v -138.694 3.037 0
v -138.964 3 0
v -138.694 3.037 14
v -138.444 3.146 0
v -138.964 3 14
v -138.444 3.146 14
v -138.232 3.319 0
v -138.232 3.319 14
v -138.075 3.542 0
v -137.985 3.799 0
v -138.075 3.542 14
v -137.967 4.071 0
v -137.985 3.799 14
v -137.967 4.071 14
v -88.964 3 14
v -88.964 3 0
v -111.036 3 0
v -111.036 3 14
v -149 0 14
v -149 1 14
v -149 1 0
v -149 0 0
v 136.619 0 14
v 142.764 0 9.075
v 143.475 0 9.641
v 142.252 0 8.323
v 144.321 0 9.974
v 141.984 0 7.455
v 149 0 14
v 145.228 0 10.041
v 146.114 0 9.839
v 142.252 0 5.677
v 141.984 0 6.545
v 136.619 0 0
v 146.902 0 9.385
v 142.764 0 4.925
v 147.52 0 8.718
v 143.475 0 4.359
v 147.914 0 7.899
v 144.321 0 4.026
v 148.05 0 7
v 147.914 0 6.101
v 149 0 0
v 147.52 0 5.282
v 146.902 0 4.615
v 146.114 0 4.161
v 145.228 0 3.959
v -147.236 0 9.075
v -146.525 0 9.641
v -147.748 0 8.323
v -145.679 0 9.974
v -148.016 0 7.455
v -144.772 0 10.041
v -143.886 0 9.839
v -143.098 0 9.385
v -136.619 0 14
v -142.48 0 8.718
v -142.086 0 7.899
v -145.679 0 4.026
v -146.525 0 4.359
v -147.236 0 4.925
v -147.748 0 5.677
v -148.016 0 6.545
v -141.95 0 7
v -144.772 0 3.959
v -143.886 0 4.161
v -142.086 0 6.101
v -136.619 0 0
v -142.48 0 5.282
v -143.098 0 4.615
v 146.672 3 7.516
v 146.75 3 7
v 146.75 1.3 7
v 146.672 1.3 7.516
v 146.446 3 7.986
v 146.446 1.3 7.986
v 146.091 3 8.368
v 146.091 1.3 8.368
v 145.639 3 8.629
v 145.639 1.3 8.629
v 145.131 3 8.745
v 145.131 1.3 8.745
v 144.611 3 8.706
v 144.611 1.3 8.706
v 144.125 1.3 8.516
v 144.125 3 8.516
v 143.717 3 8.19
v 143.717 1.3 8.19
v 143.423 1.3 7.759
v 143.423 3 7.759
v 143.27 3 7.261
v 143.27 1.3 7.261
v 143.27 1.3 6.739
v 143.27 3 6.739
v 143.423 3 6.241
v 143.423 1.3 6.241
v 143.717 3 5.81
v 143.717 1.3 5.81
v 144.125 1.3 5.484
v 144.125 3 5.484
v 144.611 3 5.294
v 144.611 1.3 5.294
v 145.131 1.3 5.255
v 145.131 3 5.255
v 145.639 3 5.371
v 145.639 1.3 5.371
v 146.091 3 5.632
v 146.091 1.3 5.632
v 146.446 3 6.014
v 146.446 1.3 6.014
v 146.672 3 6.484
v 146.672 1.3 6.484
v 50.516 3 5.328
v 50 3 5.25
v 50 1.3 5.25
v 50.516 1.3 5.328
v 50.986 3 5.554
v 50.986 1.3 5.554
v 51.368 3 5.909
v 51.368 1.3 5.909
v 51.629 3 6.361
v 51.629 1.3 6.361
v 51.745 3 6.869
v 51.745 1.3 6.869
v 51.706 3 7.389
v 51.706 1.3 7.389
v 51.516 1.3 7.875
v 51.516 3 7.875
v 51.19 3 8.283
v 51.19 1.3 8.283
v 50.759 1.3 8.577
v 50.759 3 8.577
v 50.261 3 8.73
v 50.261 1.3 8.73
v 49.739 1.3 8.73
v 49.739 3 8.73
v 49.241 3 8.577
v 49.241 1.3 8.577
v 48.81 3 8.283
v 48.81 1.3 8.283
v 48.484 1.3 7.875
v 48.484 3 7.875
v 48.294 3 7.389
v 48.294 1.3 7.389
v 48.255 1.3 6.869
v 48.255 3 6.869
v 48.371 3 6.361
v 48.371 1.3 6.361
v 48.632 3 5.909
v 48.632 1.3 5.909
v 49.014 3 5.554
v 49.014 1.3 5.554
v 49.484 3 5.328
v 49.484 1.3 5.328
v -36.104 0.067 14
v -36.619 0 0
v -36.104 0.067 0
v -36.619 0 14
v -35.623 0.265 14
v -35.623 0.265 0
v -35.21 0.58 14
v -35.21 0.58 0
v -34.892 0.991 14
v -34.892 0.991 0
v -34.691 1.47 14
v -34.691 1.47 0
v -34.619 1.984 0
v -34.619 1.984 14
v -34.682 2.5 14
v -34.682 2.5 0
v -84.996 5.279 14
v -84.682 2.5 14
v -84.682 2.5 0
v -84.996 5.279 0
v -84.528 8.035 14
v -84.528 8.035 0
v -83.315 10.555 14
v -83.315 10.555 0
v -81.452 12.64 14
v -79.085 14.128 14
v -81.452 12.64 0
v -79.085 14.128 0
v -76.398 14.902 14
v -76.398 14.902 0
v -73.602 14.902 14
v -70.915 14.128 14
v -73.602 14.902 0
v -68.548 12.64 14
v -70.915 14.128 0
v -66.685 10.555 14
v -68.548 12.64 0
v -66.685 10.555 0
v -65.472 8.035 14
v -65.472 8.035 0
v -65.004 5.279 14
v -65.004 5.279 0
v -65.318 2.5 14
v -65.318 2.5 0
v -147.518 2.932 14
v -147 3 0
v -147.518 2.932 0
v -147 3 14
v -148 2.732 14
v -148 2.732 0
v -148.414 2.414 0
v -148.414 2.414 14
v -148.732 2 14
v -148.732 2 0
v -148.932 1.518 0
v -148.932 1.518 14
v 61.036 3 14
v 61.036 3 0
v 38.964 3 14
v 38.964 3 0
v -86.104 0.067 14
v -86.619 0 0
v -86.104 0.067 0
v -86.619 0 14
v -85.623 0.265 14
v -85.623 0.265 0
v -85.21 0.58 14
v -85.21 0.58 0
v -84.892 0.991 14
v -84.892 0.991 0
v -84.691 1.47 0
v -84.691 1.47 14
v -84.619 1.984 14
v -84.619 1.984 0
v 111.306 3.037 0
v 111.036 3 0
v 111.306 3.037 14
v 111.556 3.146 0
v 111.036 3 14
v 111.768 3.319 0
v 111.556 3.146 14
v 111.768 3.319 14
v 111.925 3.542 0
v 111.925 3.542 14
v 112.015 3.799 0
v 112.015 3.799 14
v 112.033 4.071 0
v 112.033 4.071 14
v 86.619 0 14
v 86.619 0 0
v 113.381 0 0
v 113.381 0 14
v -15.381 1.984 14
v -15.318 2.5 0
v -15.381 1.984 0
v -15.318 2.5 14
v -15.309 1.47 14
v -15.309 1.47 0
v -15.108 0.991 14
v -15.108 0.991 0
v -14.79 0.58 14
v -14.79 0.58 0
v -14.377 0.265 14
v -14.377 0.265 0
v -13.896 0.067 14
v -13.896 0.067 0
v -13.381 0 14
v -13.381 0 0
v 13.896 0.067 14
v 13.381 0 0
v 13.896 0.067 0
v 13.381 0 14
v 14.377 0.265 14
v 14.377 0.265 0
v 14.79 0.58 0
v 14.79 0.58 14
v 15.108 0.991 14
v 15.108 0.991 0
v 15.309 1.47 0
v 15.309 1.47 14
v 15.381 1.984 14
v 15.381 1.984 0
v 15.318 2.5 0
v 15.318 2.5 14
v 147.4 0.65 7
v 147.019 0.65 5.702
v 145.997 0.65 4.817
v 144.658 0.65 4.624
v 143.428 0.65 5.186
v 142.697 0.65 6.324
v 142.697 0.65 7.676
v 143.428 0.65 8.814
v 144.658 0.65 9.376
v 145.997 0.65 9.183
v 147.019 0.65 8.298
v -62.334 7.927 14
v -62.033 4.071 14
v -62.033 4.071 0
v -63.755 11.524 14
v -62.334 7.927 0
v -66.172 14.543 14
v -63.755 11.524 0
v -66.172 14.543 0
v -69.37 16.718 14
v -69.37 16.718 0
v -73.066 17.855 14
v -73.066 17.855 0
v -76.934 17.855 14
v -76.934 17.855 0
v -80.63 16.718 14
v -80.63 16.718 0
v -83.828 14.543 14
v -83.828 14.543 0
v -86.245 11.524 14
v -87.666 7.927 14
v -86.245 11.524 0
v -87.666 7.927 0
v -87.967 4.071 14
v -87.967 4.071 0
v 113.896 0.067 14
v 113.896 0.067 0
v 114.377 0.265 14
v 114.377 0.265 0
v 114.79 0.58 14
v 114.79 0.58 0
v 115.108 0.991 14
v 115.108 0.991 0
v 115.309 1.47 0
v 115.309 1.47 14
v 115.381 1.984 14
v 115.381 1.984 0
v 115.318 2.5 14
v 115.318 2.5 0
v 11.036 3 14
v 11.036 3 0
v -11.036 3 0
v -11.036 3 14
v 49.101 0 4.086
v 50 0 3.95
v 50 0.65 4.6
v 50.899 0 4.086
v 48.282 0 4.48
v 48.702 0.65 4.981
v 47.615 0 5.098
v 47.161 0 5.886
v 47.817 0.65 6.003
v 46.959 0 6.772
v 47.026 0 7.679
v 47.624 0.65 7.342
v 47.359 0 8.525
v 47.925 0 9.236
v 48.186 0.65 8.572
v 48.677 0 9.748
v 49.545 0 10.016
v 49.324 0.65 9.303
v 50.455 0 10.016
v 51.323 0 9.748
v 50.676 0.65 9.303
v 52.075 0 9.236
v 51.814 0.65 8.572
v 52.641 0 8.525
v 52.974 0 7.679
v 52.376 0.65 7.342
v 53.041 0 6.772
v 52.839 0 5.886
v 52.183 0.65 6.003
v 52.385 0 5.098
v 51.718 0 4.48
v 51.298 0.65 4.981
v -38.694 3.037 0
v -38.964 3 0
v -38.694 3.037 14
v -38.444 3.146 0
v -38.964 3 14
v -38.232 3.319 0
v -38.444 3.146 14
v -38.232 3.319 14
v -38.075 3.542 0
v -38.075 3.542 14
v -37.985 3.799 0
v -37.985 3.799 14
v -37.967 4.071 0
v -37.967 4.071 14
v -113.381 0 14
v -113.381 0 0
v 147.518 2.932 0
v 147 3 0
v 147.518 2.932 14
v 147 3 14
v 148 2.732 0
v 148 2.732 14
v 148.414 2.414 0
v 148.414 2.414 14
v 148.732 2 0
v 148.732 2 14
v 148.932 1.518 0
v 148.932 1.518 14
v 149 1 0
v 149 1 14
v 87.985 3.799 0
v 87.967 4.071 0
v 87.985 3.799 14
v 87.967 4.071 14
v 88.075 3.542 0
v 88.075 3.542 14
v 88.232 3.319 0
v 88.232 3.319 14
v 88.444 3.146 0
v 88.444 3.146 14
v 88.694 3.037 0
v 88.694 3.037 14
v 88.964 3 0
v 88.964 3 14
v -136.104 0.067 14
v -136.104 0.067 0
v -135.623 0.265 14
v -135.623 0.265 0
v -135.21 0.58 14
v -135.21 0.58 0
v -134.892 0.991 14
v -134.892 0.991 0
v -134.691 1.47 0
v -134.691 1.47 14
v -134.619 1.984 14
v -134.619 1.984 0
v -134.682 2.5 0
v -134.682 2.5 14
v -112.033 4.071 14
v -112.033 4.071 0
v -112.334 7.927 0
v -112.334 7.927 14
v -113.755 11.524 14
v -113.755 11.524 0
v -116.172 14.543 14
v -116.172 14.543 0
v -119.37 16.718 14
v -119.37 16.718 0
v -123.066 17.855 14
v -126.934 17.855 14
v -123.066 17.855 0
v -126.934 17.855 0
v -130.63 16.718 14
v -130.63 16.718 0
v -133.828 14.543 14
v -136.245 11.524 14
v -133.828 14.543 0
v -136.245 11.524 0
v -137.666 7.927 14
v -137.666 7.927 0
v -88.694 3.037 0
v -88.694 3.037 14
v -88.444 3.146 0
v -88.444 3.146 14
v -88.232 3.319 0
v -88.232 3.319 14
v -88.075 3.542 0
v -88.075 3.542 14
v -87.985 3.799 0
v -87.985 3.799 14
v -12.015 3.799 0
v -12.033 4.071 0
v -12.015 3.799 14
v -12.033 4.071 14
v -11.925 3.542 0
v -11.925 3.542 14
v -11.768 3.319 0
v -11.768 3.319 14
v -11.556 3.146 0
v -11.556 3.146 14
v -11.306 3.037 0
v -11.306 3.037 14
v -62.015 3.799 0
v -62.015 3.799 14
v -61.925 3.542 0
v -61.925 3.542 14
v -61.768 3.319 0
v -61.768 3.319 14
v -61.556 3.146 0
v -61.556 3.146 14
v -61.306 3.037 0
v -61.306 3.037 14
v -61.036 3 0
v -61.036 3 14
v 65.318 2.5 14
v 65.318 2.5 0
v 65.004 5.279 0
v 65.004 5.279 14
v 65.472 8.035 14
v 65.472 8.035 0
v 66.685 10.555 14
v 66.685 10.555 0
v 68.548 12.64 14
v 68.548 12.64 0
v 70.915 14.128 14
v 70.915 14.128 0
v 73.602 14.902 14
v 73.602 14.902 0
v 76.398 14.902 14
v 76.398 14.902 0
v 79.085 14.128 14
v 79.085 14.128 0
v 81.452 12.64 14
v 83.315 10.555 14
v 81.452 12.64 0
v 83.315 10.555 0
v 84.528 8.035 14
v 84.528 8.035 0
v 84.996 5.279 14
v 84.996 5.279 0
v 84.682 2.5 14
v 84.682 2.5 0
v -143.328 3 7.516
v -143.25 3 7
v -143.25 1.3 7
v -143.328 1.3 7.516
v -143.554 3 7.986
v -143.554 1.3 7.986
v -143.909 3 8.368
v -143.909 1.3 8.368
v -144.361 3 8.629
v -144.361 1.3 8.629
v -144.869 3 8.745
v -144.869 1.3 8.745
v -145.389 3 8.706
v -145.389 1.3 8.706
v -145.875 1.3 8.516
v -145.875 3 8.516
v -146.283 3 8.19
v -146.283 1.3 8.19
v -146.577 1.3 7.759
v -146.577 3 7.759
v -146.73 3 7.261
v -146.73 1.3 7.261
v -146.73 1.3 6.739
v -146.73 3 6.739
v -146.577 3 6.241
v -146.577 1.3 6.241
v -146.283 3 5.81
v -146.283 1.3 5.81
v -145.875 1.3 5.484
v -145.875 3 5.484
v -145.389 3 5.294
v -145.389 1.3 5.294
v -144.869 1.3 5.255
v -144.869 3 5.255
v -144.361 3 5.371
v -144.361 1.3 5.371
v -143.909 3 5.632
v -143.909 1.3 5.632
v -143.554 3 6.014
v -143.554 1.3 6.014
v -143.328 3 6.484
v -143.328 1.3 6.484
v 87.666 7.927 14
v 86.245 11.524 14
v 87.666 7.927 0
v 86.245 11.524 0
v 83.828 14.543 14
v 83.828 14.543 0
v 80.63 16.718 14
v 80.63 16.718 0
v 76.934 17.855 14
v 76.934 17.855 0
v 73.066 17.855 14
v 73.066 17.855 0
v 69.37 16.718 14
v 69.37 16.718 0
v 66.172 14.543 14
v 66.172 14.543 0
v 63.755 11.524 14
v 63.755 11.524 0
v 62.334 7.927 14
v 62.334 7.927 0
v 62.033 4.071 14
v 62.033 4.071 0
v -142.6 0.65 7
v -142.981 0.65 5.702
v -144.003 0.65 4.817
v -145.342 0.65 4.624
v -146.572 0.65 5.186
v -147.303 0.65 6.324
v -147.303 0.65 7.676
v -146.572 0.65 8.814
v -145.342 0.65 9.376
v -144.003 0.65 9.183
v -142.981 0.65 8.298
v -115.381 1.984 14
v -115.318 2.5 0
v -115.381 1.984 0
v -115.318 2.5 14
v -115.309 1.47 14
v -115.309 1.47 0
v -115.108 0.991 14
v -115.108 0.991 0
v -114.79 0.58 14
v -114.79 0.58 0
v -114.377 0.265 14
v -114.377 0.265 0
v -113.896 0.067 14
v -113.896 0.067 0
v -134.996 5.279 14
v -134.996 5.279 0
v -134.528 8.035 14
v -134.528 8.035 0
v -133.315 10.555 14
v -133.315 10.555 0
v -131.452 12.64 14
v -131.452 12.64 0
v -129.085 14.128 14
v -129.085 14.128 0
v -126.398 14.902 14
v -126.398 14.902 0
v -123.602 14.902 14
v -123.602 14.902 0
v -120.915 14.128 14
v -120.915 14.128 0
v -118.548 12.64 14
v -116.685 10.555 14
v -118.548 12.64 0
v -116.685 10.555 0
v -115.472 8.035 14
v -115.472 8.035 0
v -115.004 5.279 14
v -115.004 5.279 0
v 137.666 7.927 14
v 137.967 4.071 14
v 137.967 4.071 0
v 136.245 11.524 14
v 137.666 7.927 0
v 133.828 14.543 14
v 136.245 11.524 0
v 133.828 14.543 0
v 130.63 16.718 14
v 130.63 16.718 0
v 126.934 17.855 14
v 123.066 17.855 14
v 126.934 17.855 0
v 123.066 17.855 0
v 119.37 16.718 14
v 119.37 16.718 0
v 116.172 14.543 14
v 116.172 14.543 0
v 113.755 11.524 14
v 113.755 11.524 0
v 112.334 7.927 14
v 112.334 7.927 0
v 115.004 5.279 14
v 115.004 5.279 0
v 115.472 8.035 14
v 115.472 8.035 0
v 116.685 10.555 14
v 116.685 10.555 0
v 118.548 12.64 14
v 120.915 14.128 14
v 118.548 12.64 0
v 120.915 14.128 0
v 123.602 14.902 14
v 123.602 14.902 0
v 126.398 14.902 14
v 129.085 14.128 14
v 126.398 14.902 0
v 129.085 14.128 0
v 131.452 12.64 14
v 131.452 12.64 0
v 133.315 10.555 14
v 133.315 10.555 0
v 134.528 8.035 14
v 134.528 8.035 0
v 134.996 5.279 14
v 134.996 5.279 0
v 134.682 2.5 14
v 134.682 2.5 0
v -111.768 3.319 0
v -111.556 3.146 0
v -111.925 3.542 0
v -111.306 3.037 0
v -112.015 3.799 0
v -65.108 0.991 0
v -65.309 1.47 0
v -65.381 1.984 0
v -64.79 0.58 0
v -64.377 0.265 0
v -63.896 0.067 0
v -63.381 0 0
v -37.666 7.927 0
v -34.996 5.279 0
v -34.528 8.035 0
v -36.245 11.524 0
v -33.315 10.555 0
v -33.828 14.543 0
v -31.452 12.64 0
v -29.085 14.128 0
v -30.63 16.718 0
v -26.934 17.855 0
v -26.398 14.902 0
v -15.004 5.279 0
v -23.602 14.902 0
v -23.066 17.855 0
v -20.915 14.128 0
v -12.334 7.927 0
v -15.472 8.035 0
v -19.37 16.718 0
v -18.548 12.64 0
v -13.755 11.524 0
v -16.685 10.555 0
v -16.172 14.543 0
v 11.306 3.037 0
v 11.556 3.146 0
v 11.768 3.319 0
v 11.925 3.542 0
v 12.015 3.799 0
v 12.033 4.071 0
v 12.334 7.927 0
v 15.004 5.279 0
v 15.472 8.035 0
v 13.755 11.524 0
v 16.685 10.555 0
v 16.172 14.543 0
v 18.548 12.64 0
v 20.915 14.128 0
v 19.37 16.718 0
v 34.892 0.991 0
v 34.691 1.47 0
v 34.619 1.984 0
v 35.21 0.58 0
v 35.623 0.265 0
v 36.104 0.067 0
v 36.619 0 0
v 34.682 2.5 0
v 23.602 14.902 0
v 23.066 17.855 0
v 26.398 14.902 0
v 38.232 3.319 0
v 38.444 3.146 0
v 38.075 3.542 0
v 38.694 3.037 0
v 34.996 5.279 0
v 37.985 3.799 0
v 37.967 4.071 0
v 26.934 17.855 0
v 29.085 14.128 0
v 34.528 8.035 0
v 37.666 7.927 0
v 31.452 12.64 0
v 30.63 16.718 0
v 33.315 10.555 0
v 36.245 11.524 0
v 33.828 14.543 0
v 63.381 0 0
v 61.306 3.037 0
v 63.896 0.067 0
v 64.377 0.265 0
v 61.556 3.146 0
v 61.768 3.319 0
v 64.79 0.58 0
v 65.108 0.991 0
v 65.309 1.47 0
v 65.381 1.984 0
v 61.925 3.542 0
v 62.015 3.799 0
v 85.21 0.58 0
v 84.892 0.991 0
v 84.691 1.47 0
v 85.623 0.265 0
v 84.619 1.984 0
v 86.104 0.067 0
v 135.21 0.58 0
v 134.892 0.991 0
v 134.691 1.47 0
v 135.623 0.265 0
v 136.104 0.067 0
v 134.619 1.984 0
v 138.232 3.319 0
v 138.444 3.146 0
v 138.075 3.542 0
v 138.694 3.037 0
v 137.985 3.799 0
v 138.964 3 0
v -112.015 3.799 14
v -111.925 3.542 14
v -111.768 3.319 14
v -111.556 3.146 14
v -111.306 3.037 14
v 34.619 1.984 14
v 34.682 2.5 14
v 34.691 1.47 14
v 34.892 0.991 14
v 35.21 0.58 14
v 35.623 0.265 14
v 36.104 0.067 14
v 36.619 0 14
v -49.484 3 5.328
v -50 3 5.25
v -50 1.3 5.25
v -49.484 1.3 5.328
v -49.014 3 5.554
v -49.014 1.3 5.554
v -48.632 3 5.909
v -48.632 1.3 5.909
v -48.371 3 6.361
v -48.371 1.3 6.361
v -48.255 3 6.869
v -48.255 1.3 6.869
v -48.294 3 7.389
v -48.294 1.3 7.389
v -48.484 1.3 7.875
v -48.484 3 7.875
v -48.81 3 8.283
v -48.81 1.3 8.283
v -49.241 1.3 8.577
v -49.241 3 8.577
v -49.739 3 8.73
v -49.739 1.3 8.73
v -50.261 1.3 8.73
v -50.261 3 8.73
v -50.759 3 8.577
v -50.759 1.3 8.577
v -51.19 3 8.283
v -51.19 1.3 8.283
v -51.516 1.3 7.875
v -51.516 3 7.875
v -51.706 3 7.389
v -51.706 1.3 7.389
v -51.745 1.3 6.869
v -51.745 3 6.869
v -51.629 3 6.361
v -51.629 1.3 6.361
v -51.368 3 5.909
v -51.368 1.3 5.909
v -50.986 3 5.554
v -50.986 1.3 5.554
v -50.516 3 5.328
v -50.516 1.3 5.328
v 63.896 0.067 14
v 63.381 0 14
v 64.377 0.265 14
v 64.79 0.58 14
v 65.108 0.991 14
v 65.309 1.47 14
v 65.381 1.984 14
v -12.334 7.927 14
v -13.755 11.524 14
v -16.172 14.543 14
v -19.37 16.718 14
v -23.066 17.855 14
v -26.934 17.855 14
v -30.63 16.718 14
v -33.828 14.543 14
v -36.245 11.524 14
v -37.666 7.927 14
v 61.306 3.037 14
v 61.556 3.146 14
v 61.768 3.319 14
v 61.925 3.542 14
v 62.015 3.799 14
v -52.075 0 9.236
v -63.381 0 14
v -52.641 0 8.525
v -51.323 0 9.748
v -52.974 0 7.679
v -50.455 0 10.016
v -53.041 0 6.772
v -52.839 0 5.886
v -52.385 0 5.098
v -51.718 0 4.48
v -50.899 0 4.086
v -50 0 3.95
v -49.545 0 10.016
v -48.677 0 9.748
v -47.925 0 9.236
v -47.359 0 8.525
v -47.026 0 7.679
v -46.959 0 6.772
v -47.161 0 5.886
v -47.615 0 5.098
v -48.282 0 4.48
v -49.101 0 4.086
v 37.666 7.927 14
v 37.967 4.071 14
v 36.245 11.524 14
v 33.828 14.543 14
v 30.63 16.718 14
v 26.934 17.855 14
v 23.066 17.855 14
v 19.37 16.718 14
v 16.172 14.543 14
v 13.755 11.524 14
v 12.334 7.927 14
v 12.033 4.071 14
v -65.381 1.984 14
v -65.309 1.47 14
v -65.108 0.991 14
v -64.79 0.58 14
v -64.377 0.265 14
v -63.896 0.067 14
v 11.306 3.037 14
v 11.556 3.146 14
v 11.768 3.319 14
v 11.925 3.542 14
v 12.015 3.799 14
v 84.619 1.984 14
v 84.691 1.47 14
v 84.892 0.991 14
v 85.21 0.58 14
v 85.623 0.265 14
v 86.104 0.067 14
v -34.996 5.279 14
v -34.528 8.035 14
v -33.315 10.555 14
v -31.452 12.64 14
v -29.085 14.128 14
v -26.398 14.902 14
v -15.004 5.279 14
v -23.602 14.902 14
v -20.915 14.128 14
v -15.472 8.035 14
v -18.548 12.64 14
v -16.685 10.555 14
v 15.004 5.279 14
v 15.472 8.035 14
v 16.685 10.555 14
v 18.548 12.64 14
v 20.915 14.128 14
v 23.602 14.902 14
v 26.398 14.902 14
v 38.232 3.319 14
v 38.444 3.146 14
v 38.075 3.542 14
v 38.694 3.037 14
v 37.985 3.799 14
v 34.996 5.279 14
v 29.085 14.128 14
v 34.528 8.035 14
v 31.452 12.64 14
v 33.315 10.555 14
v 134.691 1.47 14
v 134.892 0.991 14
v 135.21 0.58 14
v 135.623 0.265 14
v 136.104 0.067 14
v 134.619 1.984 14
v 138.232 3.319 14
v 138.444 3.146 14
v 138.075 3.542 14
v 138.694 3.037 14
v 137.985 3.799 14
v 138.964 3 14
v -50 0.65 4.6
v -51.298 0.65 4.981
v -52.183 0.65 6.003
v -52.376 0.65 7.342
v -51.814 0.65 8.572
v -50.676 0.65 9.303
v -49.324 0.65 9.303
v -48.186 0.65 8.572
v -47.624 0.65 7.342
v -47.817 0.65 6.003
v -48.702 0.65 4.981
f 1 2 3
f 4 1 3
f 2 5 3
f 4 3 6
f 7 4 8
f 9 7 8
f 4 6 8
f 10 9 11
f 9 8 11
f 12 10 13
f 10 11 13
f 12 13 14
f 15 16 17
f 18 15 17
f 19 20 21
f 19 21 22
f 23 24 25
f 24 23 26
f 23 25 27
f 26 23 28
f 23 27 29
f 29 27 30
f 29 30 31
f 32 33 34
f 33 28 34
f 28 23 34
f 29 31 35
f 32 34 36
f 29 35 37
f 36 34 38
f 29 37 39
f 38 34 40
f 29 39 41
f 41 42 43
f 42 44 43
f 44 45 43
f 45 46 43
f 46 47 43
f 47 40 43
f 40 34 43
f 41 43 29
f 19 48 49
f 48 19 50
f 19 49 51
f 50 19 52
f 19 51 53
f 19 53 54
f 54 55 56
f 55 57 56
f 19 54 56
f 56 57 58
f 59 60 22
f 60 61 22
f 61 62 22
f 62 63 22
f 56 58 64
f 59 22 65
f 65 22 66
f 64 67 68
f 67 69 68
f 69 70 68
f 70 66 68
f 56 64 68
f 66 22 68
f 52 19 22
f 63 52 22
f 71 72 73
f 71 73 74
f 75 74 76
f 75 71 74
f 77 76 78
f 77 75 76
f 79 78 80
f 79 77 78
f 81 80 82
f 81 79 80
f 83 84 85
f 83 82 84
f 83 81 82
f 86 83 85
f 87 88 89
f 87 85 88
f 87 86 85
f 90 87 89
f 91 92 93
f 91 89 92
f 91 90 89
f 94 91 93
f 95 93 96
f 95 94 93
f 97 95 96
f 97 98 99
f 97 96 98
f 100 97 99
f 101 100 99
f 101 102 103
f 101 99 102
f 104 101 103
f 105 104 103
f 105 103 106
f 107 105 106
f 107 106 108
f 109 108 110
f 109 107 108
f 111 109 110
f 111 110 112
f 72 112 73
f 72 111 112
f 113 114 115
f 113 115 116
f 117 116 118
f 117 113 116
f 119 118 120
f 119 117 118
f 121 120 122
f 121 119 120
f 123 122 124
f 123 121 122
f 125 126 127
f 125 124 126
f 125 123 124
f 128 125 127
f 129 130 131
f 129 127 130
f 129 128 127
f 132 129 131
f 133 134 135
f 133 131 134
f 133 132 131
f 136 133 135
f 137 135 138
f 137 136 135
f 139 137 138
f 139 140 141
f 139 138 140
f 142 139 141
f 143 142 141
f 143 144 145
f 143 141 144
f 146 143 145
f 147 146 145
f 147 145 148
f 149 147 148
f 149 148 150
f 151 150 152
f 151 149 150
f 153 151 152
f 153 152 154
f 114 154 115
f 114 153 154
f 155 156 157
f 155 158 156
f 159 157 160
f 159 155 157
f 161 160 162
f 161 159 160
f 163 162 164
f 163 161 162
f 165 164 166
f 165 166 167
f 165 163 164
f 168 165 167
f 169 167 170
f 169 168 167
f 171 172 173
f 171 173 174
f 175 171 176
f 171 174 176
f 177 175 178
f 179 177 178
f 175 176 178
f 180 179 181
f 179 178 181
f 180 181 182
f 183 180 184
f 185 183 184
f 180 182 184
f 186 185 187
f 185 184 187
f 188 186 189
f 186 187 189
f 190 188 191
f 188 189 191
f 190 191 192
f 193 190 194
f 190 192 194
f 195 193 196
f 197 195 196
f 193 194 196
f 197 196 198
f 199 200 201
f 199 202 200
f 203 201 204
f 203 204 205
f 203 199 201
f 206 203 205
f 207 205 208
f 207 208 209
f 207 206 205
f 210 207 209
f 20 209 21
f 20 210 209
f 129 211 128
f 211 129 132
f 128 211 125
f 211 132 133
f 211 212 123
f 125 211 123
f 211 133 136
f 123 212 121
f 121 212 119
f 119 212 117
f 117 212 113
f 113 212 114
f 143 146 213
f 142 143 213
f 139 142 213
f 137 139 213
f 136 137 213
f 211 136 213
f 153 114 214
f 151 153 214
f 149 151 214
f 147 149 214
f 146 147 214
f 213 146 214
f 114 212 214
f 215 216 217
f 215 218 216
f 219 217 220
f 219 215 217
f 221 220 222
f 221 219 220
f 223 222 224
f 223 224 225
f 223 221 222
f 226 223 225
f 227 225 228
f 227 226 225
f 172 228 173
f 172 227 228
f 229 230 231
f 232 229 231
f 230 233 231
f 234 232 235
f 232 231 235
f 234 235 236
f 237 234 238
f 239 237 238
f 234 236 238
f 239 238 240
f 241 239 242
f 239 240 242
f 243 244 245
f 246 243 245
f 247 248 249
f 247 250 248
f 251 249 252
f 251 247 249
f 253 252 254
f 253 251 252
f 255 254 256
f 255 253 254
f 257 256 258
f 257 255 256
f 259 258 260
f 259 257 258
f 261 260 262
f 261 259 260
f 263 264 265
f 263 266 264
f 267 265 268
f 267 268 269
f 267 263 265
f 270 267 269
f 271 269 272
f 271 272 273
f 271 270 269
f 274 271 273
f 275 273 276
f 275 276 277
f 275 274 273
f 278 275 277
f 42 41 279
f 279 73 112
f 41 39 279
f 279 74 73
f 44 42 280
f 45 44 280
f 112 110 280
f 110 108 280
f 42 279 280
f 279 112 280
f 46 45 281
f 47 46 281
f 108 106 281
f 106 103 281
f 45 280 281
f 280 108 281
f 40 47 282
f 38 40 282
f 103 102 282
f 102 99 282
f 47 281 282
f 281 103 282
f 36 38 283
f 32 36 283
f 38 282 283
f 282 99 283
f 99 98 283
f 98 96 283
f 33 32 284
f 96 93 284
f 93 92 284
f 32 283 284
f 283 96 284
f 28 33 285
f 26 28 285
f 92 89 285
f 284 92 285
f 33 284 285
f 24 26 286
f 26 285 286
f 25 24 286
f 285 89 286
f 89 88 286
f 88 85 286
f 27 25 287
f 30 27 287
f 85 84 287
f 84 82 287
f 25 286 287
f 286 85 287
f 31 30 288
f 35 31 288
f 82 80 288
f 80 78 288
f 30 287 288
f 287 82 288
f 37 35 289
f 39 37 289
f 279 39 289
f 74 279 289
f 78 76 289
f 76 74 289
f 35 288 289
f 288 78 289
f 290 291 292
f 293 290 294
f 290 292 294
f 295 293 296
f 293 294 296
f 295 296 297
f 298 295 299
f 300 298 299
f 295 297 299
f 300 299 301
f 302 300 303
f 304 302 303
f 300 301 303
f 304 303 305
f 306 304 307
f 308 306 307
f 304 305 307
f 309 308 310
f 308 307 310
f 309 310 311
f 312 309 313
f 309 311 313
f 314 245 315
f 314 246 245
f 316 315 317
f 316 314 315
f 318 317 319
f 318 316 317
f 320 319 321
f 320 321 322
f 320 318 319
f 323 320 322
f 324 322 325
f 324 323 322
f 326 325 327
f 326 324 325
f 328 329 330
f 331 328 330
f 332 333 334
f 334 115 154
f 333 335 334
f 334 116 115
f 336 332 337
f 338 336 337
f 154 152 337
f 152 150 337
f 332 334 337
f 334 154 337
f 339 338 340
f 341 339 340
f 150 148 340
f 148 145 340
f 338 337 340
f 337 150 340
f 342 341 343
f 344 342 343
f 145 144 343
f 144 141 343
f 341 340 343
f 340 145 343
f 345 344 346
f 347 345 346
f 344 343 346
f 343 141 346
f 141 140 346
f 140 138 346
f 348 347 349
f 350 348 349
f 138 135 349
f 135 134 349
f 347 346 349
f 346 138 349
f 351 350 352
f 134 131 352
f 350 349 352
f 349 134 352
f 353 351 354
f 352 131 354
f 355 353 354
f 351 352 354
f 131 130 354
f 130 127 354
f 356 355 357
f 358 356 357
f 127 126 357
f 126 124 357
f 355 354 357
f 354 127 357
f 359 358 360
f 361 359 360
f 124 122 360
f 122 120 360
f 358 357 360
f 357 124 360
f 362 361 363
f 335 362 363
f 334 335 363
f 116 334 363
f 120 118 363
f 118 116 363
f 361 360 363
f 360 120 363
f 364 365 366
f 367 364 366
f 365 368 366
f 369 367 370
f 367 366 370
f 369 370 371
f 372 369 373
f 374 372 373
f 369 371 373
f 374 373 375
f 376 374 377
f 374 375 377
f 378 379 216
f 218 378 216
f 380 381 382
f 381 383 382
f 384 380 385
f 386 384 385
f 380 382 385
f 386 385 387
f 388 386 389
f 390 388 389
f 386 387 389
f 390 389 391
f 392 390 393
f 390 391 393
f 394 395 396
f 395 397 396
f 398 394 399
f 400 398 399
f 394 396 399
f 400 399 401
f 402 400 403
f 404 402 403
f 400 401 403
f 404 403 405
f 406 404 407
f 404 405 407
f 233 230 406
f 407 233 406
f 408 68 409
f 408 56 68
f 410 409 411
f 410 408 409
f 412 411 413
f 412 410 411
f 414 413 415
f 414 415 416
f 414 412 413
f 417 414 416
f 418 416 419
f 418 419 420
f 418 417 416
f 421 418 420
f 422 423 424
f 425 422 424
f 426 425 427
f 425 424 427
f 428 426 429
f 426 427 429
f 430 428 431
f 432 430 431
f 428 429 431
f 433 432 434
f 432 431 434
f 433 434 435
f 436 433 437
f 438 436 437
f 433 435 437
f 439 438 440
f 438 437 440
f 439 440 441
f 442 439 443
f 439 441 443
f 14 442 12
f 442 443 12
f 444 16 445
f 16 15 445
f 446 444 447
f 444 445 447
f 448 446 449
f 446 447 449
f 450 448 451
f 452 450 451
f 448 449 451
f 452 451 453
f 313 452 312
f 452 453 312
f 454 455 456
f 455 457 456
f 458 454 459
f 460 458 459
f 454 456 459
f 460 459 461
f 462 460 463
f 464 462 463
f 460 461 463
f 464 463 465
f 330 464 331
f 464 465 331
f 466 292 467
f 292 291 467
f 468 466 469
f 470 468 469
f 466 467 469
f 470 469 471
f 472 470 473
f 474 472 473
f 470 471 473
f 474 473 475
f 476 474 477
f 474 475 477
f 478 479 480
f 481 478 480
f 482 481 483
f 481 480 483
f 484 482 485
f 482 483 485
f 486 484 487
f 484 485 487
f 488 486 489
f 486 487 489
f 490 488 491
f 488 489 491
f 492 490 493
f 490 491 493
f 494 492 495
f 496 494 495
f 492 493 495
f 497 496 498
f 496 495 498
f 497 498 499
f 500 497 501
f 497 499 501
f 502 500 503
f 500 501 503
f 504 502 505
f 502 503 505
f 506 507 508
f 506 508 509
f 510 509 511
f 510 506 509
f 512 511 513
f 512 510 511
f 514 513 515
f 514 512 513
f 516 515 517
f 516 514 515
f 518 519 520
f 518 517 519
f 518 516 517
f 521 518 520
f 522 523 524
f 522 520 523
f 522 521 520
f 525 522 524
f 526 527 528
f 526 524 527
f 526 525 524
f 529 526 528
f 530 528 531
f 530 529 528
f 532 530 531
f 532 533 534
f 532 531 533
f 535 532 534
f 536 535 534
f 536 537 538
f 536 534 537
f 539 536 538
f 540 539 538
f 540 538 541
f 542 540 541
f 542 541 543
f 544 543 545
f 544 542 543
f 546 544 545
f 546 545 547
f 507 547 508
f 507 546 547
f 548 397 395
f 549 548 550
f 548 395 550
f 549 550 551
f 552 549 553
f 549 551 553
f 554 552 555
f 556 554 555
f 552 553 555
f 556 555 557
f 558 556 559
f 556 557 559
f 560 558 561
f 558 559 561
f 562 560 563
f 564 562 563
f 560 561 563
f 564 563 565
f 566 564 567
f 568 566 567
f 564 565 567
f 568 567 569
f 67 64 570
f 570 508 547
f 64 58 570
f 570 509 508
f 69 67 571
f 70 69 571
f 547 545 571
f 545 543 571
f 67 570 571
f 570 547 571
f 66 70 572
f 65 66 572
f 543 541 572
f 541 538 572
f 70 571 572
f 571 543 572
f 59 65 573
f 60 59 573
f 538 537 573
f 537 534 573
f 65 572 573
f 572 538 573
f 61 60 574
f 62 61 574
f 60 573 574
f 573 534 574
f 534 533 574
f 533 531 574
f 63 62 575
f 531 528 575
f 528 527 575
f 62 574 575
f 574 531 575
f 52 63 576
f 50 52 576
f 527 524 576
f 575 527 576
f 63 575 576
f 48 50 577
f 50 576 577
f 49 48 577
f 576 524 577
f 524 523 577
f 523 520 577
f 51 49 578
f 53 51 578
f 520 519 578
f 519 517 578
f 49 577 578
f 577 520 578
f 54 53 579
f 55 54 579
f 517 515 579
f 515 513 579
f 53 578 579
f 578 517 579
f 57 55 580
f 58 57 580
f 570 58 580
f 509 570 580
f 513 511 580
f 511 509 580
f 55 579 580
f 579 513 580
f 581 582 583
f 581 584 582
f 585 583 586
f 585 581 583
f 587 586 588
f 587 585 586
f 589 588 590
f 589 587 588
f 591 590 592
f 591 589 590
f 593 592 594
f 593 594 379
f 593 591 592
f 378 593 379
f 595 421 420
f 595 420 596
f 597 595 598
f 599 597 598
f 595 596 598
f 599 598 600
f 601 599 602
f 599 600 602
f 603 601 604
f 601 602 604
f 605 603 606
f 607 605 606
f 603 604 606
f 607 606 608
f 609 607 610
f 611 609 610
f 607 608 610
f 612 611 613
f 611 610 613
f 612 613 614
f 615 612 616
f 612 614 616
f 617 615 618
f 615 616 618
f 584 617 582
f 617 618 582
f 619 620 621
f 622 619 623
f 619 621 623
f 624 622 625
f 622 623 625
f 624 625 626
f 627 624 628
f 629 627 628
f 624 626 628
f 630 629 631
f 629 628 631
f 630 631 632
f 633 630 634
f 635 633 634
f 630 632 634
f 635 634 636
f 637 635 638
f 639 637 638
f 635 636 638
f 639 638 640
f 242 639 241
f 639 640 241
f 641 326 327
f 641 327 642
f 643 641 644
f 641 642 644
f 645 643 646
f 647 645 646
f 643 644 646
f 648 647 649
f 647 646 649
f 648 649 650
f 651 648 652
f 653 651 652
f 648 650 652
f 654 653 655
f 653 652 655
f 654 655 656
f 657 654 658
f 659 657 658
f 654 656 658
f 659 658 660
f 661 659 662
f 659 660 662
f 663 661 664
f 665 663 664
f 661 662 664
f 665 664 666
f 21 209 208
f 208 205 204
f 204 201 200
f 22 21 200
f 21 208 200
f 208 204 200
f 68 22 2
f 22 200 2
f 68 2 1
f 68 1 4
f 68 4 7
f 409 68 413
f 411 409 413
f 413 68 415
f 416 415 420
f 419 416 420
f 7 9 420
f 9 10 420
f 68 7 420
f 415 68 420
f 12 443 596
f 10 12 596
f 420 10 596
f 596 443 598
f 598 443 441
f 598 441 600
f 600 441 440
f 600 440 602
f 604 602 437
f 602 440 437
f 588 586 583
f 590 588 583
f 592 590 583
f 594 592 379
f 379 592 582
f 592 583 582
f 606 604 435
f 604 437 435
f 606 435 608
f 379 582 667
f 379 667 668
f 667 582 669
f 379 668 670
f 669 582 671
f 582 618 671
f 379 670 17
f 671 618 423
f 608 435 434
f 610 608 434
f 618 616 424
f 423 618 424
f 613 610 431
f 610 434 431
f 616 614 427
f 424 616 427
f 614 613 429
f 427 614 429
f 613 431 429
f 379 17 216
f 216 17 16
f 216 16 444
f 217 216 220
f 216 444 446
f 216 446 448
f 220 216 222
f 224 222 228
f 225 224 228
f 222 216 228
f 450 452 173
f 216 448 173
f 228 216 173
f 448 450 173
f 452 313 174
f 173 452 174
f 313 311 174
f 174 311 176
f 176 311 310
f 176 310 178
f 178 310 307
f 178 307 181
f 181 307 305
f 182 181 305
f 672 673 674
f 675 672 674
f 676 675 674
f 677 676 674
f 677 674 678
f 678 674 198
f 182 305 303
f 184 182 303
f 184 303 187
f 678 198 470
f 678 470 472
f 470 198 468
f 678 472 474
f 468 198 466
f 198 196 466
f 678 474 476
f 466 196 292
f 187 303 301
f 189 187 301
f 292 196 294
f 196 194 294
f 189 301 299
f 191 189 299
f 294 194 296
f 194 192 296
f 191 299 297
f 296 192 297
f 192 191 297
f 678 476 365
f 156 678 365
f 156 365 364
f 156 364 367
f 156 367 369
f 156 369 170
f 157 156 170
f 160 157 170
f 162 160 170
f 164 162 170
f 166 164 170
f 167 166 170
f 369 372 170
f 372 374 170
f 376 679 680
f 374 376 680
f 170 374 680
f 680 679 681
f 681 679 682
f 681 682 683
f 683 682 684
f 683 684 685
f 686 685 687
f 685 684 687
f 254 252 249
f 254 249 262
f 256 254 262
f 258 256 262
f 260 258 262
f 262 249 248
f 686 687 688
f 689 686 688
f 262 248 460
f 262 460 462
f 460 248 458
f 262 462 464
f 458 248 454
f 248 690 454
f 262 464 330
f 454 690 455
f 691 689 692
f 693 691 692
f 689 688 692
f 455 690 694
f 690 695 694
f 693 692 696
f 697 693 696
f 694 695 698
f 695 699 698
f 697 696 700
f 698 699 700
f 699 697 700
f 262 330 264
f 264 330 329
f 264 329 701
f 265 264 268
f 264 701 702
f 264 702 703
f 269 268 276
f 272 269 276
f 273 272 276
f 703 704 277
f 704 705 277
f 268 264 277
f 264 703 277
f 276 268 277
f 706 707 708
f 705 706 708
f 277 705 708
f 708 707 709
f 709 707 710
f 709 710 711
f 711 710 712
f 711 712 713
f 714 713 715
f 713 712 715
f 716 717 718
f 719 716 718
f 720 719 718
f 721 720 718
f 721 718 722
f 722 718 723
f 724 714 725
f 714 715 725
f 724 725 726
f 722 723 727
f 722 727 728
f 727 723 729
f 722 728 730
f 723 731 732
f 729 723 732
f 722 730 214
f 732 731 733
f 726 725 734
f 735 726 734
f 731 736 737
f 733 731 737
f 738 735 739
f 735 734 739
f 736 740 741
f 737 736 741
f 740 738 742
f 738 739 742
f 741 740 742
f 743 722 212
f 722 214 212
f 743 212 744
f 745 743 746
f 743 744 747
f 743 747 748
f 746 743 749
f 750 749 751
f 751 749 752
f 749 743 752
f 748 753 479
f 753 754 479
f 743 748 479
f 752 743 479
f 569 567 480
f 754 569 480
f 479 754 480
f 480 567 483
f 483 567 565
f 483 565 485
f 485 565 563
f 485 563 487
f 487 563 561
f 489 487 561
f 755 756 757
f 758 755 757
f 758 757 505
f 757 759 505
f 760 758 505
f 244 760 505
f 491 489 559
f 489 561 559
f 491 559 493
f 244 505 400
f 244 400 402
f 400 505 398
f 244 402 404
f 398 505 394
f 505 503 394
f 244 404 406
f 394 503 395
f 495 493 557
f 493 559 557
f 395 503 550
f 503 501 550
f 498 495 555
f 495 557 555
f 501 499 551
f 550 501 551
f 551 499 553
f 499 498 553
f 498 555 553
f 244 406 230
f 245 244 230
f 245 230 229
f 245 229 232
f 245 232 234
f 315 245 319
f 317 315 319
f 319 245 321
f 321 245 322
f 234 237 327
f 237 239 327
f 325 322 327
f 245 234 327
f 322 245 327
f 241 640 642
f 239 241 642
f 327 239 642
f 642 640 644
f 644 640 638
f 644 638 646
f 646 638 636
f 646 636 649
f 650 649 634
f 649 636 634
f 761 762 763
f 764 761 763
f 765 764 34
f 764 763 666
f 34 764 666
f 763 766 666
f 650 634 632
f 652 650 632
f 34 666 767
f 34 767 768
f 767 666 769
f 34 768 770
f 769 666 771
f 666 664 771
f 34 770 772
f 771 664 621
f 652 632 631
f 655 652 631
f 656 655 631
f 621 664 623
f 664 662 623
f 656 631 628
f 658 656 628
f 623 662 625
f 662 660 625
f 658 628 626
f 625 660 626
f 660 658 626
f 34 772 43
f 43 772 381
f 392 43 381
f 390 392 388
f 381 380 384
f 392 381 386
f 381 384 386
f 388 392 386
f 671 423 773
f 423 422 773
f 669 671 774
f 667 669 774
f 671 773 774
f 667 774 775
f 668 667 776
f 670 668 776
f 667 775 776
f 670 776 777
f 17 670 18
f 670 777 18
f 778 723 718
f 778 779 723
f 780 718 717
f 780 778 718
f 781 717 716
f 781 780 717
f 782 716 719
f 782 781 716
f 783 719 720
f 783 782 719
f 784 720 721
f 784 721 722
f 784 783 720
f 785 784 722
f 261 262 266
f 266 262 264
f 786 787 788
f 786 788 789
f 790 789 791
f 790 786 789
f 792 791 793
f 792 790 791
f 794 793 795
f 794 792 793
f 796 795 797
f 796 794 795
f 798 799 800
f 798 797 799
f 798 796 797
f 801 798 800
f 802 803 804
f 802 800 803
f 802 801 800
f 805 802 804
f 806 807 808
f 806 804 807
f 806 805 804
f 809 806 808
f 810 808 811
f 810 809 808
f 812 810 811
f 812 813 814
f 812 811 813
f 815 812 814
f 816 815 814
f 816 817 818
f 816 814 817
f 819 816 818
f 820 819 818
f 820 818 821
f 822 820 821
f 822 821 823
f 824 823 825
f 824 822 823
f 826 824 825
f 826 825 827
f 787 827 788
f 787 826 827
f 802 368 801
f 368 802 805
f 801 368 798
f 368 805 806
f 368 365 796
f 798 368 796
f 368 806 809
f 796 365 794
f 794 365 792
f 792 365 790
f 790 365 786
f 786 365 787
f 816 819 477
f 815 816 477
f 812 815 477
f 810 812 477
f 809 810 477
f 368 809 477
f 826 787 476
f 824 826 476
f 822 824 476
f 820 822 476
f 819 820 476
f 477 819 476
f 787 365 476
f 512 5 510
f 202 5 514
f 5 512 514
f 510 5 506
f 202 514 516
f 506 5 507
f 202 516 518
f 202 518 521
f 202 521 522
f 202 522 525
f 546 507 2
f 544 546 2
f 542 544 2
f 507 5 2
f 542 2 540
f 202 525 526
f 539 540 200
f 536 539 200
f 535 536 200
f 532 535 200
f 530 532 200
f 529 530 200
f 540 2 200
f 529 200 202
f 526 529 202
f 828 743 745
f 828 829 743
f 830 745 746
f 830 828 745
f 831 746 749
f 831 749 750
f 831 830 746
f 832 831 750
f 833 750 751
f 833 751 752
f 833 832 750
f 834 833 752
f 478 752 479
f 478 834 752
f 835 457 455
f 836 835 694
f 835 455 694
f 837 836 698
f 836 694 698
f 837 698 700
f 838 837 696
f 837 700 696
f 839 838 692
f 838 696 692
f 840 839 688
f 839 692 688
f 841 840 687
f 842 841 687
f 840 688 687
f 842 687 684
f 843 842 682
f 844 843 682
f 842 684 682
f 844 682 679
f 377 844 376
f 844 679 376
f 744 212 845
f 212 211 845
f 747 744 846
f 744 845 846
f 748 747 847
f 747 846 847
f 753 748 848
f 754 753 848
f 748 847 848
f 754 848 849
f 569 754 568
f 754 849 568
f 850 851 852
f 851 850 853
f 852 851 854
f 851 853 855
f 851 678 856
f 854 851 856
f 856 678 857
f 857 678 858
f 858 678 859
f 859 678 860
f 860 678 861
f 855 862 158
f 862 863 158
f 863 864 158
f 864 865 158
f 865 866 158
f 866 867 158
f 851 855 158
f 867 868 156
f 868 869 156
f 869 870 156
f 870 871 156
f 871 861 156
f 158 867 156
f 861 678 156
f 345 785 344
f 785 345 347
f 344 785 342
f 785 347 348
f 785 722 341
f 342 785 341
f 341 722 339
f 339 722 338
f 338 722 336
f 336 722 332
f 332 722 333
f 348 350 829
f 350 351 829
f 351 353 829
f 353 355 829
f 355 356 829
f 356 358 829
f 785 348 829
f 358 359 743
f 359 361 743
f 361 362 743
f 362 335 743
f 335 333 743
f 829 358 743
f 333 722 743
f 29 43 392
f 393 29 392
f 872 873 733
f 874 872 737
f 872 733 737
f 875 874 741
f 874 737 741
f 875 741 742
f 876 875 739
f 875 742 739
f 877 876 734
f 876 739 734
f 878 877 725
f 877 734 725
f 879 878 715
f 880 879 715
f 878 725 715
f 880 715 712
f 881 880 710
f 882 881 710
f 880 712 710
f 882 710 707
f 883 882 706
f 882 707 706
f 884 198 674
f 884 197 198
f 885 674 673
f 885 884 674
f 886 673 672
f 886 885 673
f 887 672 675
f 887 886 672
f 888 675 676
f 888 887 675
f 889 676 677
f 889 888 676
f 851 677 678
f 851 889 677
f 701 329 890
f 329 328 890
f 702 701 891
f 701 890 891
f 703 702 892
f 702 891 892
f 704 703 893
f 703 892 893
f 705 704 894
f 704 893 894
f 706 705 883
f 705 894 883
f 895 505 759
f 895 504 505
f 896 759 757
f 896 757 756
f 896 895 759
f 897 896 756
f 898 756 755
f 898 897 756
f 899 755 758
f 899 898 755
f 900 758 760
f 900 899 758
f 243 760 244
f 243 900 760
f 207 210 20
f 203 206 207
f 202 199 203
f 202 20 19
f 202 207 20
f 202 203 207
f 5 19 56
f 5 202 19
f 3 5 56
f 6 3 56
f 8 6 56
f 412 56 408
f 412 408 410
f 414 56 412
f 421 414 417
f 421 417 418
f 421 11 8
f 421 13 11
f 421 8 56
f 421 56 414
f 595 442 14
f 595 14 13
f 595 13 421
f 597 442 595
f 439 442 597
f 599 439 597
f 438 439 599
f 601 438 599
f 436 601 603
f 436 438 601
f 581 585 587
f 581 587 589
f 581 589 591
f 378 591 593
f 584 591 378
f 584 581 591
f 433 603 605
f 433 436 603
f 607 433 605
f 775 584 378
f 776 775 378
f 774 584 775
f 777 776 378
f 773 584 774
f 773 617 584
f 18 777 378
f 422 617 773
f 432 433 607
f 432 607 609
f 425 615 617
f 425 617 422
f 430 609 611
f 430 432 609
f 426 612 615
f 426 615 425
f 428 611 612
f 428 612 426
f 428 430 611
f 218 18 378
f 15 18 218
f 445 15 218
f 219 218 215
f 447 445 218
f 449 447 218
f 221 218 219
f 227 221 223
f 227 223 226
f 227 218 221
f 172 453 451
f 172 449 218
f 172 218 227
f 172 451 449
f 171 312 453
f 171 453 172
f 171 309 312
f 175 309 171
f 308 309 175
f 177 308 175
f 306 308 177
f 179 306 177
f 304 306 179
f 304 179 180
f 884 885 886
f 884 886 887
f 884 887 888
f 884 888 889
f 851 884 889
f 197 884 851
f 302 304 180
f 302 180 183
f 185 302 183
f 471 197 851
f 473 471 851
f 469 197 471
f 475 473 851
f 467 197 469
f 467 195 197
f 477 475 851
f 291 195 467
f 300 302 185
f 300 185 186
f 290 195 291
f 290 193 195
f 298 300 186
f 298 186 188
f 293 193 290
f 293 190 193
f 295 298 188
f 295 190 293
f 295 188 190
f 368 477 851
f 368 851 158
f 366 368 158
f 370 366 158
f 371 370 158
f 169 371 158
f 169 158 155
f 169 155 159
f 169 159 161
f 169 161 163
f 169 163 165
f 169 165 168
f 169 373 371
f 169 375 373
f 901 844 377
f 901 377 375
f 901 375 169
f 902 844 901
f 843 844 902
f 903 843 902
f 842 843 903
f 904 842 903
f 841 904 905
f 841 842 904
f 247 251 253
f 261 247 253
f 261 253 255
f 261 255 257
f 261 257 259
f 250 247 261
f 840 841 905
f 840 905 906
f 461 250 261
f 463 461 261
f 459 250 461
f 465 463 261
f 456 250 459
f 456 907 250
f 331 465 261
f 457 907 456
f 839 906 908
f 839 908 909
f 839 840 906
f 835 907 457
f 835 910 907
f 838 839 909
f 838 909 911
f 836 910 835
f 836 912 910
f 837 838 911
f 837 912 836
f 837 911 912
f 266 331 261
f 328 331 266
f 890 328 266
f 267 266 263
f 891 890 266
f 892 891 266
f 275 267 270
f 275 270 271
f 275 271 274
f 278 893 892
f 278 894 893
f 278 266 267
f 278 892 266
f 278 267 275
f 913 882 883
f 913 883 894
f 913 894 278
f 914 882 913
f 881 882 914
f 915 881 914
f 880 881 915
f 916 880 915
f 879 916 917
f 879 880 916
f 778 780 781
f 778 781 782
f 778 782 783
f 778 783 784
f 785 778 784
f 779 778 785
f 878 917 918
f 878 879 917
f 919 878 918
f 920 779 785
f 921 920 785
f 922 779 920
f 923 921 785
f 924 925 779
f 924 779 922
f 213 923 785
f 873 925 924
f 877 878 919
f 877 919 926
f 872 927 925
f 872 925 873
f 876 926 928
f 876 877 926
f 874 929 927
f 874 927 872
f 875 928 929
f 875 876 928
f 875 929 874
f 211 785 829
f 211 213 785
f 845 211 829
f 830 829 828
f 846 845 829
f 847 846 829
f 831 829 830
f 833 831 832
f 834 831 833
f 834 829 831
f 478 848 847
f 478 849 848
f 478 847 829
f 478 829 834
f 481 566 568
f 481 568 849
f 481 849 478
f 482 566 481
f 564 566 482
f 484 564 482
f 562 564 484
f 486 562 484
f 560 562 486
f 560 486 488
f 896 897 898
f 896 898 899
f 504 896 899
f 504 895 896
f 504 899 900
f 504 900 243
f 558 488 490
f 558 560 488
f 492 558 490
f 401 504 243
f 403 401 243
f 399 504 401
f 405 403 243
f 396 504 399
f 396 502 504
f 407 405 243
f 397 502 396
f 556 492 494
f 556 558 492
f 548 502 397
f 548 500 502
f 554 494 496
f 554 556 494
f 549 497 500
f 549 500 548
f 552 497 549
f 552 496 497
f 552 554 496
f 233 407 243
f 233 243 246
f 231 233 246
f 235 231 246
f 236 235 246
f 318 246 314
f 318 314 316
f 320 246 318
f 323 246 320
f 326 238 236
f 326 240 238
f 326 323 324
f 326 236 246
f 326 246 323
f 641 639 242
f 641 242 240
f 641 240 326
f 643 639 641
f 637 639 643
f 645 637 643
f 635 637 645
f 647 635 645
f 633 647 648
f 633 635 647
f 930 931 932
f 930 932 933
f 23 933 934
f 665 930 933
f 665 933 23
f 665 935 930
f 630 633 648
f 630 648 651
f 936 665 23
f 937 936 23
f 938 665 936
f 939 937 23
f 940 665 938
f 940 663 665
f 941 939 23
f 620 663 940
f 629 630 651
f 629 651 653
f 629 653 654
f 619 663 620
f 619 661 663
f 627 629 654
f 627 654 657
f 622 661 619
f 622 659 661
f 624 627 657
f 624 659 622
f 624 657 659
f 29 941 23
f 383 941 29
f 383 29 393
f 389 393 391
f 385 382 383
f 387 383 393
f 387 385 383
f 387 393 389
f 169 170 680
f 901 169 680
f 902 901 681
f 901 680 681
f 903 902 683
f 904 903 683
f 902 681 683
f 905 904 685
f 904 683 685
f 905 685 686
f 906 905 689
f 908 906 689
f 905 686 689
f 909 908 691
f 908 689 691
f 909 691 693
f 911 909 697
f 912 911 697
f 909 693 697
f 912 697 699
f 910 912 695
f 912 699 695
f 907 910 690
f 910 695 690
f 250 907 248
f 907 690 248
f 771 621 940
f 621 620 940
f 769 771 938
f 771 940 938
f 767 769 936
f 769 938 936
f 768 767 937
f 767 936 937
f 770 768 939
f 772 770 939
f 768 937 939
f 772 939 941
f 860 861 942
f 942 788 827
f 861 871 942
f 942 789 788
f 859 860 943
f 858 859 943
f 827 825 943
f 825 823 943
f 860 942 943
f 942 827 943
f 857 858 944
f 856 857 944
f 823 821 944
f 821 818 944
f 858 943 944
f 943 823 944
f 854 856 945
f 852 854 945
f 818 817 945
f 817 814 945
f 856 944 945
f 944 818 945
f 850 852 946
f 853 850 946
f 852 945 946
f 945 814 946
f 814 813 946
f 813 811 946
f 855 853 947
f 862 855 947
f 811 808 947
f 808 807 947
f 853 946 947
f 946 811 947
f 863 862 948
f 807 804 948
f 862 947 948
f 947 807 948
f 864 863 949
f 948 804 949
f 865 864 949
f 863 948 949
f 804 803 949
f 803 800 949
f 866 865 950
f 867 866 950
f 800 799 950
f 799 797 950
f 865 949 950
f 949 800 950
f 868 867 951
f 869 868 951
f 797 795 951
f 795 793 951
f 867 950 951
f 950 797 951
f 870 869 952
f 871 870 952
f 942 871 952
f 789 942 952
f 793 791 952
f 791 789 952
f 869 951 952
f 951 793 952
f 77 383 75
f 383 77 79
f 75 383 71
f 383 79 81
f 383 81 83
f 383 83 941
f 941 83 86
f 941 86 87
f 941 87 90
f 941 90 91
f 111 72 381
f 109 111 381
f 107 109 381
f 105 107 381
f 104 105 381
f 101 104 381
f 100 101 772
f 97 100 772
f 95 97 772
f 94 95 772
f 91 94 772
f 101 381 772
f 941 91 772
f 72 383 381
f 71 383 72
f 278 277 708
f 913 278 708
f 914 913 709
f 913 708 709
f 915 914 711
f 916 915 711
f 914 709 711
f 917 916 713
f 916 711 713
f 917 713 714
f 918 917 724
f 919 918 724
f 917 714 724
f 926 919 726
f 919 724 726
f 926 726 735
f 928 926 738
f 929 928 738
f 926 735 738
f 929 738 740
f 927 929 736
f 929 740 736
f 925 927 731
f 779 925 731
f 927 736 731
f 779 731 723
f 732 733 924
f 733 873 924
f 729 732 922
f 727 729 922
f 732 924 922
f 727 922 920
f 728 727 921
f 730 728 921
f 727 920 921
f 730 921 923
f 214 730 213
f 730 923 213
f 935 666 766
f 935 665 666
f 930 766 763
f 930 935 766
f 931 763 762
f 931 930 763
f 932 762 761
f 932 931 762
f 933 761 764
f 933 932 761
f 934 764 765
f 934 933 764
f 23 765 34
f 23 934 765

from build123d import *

# Parameters (mm, degrees)
EXTRU_MINCE1_DEPTH           = 14
CONG_1_R                     = 2
CONG_2_R                     = 1
CONG_3_R                     = 2
ENL_V_MAT_EXTRU_1_DEPTH      = 151.73486657
ENL_V_MAT_EXTRU_1_DEPTH_BACK = 151.73486657
ESQUISSE2_R                  = 1.75
CHANFREIN1_SIZE              = 1.3


with BuildPart() as part:
    # Esquisse1 → Extru.-Mince1 (new body)
    with BuildSketch(Plane.XY):
        with BuildLine():
            Line((-149, 0), (-133.660254038, 0))
            ThreePointArc((-133.660254038, 0), (-125, 15), (-116.339745962, 0))
            Line((-116.339745962, 0), (-83.660254038, 0))
            ThreePointArc((-83.660254038, 0), (-75, 15), (-66.339745962, 0))
            Line((-66.339745962, 0), (-33.660254038, 0))
            ThreePointArc((-33.660254038, 0), (-25, 15), (-16.339745962, 0))
            Line((-16.339745962, 0), (16.339745962, 0))
            ThreePointArc((16.339745962, 0), (25, 15), (33.660254038, 0))
            Line((33.660254038, 0), (66.339745962, 0))
            ThreePointArc((66.339745962, 0), (75, 15), (83.660254038, 0))
            Line((83.660254038, 0), (116.339745962, 0))
            ThreePointArc((116.339745962, 0), (125, 15), (133.660254038, 0))
            Line((133.660254038, 0), (149, 0))
            Line((149, 0), (149, 3))
            Line((149, 3), (137.845232579, 3))
            ThreePointArc((137.845232579, 3), (125, 18), (112.154767421, 3))
            Line((112.154767421, 3), (87.845232579, 3))
            ThreePointArc((87.845232579, 3), (75, 18), (62.154767421, 3))
            Line((62.154767421, 3), (37.845232579, 3))
            ThreePointArc((37.845232579, 3), (25, 18), (12.154767421, 3))
            Line((12.154767421, 3), (-12.154767421, 3))
            ThreePointArc((-12.154767421, 3), (-25, 18), (-37.845232579, 3))
            Line((-37.845232579, 3), (-62.154767421, 3))
            ThreePointArc((-62.154767421, 3), (-75, 18), (-87.845232579, 3))
            Line((-87.845232579, 3), (-112.154767421, 3))
            ThreePointArc((-112.154767421, 3), (-125, 18), (-137.845232579, 3))
            Line((-137.845232579, 3), (-149, 3))
            Line((-149, 3), (-149, 0))
        make_face()
    extrude(amount=EXTRU_MINCE1_DEPTH)

    # Congé1
    cong_1_edges = [part.edges().sort_by_distance(p)[0] for p in [
        (133.660254038, 0, 7),
        (116.339745962, 0, 7),
        (83.660254038, 0, 7),
        (66.339745962, 0, 7),
        (33.660254038, 0, 7),
        (16.339745962, 0, 7),
        (-16.339745962, 0, 7),
        (-33.660254038, 0, 7),
        (-66.339745962, 0, 7),
        (-83.660254038, 0, 7),
        (-116.339745962, 0, 7),
        (-133.660254038, 0, 7),
    ]]
    fillet(cong_1_edges, radius=CONG_1_R)

    # Congé2
    cong_2_edges = [part.edges().sort_by_distance(p)[0] for p in [
        (-137.845232579, 3, 7),
        (-112.154767421, 3, 7),
        (-87.845232579, 3, 7),
        (-62.154767421, 3, 7),
        (-37.845232579, 3, 7),
        (-12.154767421, 3, 7),
        (12.154767421, 3, 7),
        (37.845232579, 3, 7),
        (62.154767421, 3, 7),
        (87.845232579, 3, 7),
        (112.154767421, 3, 7),
        (137.845232579, 3, 7),
    ]]
    fillet(cong_2_edges, radius=CONG_2_R)

    # Congé3
    cong_3_edges = [part.edges().sort_by_distance(p)[0] for p in [
        (149, 3, 7),
        (-149, 3, 7),
    ]]
    fillet(cong_3_edges, radius=CONG_3_R)

    # Esquisse2 → Enlèv. mat.-Extru.1 (cut, two sides: drawn at the far end of the back side and taken through both)
    with BuildSketch(Plane.XZ.offset(-ENL_V_MAT_EXTRU_1_DEPTH_BACK)):
        with Locations((-145, 7)):
            Circle(ESQUISSE2_R)
        with Locations((145, 7)):
            Circle(ESQUISSE2_R)
        with Locations(Location((-50, 7, 0), (0, 0, 270))):
            Circle(ESQUISSE2_R)
        with Locations(Location((50, 7, 0), (0, 0, 270))):
            Circle(ESQUISSE2_R)
    extrude(amount=ENL_V_MAT_EXTRU_1_DEPTH + ENL_V_MAT_EXTRU_1_DEPTH_BACK, mode=Mode.SUBTRACT)

    # Chanfrein1
    chanfrein1_edges = [part.edges().sort_by_distance(p)[0] for p in [
        (-146.75, 0, 7),
        (50, 0, 8.75),
        (-50, 0, 8.75),
        (143.25, 0, 7),
    ]]
    chamfer(chanfrein1_edges, length=CHANFREIN1_SIZE)


solid = part.part
